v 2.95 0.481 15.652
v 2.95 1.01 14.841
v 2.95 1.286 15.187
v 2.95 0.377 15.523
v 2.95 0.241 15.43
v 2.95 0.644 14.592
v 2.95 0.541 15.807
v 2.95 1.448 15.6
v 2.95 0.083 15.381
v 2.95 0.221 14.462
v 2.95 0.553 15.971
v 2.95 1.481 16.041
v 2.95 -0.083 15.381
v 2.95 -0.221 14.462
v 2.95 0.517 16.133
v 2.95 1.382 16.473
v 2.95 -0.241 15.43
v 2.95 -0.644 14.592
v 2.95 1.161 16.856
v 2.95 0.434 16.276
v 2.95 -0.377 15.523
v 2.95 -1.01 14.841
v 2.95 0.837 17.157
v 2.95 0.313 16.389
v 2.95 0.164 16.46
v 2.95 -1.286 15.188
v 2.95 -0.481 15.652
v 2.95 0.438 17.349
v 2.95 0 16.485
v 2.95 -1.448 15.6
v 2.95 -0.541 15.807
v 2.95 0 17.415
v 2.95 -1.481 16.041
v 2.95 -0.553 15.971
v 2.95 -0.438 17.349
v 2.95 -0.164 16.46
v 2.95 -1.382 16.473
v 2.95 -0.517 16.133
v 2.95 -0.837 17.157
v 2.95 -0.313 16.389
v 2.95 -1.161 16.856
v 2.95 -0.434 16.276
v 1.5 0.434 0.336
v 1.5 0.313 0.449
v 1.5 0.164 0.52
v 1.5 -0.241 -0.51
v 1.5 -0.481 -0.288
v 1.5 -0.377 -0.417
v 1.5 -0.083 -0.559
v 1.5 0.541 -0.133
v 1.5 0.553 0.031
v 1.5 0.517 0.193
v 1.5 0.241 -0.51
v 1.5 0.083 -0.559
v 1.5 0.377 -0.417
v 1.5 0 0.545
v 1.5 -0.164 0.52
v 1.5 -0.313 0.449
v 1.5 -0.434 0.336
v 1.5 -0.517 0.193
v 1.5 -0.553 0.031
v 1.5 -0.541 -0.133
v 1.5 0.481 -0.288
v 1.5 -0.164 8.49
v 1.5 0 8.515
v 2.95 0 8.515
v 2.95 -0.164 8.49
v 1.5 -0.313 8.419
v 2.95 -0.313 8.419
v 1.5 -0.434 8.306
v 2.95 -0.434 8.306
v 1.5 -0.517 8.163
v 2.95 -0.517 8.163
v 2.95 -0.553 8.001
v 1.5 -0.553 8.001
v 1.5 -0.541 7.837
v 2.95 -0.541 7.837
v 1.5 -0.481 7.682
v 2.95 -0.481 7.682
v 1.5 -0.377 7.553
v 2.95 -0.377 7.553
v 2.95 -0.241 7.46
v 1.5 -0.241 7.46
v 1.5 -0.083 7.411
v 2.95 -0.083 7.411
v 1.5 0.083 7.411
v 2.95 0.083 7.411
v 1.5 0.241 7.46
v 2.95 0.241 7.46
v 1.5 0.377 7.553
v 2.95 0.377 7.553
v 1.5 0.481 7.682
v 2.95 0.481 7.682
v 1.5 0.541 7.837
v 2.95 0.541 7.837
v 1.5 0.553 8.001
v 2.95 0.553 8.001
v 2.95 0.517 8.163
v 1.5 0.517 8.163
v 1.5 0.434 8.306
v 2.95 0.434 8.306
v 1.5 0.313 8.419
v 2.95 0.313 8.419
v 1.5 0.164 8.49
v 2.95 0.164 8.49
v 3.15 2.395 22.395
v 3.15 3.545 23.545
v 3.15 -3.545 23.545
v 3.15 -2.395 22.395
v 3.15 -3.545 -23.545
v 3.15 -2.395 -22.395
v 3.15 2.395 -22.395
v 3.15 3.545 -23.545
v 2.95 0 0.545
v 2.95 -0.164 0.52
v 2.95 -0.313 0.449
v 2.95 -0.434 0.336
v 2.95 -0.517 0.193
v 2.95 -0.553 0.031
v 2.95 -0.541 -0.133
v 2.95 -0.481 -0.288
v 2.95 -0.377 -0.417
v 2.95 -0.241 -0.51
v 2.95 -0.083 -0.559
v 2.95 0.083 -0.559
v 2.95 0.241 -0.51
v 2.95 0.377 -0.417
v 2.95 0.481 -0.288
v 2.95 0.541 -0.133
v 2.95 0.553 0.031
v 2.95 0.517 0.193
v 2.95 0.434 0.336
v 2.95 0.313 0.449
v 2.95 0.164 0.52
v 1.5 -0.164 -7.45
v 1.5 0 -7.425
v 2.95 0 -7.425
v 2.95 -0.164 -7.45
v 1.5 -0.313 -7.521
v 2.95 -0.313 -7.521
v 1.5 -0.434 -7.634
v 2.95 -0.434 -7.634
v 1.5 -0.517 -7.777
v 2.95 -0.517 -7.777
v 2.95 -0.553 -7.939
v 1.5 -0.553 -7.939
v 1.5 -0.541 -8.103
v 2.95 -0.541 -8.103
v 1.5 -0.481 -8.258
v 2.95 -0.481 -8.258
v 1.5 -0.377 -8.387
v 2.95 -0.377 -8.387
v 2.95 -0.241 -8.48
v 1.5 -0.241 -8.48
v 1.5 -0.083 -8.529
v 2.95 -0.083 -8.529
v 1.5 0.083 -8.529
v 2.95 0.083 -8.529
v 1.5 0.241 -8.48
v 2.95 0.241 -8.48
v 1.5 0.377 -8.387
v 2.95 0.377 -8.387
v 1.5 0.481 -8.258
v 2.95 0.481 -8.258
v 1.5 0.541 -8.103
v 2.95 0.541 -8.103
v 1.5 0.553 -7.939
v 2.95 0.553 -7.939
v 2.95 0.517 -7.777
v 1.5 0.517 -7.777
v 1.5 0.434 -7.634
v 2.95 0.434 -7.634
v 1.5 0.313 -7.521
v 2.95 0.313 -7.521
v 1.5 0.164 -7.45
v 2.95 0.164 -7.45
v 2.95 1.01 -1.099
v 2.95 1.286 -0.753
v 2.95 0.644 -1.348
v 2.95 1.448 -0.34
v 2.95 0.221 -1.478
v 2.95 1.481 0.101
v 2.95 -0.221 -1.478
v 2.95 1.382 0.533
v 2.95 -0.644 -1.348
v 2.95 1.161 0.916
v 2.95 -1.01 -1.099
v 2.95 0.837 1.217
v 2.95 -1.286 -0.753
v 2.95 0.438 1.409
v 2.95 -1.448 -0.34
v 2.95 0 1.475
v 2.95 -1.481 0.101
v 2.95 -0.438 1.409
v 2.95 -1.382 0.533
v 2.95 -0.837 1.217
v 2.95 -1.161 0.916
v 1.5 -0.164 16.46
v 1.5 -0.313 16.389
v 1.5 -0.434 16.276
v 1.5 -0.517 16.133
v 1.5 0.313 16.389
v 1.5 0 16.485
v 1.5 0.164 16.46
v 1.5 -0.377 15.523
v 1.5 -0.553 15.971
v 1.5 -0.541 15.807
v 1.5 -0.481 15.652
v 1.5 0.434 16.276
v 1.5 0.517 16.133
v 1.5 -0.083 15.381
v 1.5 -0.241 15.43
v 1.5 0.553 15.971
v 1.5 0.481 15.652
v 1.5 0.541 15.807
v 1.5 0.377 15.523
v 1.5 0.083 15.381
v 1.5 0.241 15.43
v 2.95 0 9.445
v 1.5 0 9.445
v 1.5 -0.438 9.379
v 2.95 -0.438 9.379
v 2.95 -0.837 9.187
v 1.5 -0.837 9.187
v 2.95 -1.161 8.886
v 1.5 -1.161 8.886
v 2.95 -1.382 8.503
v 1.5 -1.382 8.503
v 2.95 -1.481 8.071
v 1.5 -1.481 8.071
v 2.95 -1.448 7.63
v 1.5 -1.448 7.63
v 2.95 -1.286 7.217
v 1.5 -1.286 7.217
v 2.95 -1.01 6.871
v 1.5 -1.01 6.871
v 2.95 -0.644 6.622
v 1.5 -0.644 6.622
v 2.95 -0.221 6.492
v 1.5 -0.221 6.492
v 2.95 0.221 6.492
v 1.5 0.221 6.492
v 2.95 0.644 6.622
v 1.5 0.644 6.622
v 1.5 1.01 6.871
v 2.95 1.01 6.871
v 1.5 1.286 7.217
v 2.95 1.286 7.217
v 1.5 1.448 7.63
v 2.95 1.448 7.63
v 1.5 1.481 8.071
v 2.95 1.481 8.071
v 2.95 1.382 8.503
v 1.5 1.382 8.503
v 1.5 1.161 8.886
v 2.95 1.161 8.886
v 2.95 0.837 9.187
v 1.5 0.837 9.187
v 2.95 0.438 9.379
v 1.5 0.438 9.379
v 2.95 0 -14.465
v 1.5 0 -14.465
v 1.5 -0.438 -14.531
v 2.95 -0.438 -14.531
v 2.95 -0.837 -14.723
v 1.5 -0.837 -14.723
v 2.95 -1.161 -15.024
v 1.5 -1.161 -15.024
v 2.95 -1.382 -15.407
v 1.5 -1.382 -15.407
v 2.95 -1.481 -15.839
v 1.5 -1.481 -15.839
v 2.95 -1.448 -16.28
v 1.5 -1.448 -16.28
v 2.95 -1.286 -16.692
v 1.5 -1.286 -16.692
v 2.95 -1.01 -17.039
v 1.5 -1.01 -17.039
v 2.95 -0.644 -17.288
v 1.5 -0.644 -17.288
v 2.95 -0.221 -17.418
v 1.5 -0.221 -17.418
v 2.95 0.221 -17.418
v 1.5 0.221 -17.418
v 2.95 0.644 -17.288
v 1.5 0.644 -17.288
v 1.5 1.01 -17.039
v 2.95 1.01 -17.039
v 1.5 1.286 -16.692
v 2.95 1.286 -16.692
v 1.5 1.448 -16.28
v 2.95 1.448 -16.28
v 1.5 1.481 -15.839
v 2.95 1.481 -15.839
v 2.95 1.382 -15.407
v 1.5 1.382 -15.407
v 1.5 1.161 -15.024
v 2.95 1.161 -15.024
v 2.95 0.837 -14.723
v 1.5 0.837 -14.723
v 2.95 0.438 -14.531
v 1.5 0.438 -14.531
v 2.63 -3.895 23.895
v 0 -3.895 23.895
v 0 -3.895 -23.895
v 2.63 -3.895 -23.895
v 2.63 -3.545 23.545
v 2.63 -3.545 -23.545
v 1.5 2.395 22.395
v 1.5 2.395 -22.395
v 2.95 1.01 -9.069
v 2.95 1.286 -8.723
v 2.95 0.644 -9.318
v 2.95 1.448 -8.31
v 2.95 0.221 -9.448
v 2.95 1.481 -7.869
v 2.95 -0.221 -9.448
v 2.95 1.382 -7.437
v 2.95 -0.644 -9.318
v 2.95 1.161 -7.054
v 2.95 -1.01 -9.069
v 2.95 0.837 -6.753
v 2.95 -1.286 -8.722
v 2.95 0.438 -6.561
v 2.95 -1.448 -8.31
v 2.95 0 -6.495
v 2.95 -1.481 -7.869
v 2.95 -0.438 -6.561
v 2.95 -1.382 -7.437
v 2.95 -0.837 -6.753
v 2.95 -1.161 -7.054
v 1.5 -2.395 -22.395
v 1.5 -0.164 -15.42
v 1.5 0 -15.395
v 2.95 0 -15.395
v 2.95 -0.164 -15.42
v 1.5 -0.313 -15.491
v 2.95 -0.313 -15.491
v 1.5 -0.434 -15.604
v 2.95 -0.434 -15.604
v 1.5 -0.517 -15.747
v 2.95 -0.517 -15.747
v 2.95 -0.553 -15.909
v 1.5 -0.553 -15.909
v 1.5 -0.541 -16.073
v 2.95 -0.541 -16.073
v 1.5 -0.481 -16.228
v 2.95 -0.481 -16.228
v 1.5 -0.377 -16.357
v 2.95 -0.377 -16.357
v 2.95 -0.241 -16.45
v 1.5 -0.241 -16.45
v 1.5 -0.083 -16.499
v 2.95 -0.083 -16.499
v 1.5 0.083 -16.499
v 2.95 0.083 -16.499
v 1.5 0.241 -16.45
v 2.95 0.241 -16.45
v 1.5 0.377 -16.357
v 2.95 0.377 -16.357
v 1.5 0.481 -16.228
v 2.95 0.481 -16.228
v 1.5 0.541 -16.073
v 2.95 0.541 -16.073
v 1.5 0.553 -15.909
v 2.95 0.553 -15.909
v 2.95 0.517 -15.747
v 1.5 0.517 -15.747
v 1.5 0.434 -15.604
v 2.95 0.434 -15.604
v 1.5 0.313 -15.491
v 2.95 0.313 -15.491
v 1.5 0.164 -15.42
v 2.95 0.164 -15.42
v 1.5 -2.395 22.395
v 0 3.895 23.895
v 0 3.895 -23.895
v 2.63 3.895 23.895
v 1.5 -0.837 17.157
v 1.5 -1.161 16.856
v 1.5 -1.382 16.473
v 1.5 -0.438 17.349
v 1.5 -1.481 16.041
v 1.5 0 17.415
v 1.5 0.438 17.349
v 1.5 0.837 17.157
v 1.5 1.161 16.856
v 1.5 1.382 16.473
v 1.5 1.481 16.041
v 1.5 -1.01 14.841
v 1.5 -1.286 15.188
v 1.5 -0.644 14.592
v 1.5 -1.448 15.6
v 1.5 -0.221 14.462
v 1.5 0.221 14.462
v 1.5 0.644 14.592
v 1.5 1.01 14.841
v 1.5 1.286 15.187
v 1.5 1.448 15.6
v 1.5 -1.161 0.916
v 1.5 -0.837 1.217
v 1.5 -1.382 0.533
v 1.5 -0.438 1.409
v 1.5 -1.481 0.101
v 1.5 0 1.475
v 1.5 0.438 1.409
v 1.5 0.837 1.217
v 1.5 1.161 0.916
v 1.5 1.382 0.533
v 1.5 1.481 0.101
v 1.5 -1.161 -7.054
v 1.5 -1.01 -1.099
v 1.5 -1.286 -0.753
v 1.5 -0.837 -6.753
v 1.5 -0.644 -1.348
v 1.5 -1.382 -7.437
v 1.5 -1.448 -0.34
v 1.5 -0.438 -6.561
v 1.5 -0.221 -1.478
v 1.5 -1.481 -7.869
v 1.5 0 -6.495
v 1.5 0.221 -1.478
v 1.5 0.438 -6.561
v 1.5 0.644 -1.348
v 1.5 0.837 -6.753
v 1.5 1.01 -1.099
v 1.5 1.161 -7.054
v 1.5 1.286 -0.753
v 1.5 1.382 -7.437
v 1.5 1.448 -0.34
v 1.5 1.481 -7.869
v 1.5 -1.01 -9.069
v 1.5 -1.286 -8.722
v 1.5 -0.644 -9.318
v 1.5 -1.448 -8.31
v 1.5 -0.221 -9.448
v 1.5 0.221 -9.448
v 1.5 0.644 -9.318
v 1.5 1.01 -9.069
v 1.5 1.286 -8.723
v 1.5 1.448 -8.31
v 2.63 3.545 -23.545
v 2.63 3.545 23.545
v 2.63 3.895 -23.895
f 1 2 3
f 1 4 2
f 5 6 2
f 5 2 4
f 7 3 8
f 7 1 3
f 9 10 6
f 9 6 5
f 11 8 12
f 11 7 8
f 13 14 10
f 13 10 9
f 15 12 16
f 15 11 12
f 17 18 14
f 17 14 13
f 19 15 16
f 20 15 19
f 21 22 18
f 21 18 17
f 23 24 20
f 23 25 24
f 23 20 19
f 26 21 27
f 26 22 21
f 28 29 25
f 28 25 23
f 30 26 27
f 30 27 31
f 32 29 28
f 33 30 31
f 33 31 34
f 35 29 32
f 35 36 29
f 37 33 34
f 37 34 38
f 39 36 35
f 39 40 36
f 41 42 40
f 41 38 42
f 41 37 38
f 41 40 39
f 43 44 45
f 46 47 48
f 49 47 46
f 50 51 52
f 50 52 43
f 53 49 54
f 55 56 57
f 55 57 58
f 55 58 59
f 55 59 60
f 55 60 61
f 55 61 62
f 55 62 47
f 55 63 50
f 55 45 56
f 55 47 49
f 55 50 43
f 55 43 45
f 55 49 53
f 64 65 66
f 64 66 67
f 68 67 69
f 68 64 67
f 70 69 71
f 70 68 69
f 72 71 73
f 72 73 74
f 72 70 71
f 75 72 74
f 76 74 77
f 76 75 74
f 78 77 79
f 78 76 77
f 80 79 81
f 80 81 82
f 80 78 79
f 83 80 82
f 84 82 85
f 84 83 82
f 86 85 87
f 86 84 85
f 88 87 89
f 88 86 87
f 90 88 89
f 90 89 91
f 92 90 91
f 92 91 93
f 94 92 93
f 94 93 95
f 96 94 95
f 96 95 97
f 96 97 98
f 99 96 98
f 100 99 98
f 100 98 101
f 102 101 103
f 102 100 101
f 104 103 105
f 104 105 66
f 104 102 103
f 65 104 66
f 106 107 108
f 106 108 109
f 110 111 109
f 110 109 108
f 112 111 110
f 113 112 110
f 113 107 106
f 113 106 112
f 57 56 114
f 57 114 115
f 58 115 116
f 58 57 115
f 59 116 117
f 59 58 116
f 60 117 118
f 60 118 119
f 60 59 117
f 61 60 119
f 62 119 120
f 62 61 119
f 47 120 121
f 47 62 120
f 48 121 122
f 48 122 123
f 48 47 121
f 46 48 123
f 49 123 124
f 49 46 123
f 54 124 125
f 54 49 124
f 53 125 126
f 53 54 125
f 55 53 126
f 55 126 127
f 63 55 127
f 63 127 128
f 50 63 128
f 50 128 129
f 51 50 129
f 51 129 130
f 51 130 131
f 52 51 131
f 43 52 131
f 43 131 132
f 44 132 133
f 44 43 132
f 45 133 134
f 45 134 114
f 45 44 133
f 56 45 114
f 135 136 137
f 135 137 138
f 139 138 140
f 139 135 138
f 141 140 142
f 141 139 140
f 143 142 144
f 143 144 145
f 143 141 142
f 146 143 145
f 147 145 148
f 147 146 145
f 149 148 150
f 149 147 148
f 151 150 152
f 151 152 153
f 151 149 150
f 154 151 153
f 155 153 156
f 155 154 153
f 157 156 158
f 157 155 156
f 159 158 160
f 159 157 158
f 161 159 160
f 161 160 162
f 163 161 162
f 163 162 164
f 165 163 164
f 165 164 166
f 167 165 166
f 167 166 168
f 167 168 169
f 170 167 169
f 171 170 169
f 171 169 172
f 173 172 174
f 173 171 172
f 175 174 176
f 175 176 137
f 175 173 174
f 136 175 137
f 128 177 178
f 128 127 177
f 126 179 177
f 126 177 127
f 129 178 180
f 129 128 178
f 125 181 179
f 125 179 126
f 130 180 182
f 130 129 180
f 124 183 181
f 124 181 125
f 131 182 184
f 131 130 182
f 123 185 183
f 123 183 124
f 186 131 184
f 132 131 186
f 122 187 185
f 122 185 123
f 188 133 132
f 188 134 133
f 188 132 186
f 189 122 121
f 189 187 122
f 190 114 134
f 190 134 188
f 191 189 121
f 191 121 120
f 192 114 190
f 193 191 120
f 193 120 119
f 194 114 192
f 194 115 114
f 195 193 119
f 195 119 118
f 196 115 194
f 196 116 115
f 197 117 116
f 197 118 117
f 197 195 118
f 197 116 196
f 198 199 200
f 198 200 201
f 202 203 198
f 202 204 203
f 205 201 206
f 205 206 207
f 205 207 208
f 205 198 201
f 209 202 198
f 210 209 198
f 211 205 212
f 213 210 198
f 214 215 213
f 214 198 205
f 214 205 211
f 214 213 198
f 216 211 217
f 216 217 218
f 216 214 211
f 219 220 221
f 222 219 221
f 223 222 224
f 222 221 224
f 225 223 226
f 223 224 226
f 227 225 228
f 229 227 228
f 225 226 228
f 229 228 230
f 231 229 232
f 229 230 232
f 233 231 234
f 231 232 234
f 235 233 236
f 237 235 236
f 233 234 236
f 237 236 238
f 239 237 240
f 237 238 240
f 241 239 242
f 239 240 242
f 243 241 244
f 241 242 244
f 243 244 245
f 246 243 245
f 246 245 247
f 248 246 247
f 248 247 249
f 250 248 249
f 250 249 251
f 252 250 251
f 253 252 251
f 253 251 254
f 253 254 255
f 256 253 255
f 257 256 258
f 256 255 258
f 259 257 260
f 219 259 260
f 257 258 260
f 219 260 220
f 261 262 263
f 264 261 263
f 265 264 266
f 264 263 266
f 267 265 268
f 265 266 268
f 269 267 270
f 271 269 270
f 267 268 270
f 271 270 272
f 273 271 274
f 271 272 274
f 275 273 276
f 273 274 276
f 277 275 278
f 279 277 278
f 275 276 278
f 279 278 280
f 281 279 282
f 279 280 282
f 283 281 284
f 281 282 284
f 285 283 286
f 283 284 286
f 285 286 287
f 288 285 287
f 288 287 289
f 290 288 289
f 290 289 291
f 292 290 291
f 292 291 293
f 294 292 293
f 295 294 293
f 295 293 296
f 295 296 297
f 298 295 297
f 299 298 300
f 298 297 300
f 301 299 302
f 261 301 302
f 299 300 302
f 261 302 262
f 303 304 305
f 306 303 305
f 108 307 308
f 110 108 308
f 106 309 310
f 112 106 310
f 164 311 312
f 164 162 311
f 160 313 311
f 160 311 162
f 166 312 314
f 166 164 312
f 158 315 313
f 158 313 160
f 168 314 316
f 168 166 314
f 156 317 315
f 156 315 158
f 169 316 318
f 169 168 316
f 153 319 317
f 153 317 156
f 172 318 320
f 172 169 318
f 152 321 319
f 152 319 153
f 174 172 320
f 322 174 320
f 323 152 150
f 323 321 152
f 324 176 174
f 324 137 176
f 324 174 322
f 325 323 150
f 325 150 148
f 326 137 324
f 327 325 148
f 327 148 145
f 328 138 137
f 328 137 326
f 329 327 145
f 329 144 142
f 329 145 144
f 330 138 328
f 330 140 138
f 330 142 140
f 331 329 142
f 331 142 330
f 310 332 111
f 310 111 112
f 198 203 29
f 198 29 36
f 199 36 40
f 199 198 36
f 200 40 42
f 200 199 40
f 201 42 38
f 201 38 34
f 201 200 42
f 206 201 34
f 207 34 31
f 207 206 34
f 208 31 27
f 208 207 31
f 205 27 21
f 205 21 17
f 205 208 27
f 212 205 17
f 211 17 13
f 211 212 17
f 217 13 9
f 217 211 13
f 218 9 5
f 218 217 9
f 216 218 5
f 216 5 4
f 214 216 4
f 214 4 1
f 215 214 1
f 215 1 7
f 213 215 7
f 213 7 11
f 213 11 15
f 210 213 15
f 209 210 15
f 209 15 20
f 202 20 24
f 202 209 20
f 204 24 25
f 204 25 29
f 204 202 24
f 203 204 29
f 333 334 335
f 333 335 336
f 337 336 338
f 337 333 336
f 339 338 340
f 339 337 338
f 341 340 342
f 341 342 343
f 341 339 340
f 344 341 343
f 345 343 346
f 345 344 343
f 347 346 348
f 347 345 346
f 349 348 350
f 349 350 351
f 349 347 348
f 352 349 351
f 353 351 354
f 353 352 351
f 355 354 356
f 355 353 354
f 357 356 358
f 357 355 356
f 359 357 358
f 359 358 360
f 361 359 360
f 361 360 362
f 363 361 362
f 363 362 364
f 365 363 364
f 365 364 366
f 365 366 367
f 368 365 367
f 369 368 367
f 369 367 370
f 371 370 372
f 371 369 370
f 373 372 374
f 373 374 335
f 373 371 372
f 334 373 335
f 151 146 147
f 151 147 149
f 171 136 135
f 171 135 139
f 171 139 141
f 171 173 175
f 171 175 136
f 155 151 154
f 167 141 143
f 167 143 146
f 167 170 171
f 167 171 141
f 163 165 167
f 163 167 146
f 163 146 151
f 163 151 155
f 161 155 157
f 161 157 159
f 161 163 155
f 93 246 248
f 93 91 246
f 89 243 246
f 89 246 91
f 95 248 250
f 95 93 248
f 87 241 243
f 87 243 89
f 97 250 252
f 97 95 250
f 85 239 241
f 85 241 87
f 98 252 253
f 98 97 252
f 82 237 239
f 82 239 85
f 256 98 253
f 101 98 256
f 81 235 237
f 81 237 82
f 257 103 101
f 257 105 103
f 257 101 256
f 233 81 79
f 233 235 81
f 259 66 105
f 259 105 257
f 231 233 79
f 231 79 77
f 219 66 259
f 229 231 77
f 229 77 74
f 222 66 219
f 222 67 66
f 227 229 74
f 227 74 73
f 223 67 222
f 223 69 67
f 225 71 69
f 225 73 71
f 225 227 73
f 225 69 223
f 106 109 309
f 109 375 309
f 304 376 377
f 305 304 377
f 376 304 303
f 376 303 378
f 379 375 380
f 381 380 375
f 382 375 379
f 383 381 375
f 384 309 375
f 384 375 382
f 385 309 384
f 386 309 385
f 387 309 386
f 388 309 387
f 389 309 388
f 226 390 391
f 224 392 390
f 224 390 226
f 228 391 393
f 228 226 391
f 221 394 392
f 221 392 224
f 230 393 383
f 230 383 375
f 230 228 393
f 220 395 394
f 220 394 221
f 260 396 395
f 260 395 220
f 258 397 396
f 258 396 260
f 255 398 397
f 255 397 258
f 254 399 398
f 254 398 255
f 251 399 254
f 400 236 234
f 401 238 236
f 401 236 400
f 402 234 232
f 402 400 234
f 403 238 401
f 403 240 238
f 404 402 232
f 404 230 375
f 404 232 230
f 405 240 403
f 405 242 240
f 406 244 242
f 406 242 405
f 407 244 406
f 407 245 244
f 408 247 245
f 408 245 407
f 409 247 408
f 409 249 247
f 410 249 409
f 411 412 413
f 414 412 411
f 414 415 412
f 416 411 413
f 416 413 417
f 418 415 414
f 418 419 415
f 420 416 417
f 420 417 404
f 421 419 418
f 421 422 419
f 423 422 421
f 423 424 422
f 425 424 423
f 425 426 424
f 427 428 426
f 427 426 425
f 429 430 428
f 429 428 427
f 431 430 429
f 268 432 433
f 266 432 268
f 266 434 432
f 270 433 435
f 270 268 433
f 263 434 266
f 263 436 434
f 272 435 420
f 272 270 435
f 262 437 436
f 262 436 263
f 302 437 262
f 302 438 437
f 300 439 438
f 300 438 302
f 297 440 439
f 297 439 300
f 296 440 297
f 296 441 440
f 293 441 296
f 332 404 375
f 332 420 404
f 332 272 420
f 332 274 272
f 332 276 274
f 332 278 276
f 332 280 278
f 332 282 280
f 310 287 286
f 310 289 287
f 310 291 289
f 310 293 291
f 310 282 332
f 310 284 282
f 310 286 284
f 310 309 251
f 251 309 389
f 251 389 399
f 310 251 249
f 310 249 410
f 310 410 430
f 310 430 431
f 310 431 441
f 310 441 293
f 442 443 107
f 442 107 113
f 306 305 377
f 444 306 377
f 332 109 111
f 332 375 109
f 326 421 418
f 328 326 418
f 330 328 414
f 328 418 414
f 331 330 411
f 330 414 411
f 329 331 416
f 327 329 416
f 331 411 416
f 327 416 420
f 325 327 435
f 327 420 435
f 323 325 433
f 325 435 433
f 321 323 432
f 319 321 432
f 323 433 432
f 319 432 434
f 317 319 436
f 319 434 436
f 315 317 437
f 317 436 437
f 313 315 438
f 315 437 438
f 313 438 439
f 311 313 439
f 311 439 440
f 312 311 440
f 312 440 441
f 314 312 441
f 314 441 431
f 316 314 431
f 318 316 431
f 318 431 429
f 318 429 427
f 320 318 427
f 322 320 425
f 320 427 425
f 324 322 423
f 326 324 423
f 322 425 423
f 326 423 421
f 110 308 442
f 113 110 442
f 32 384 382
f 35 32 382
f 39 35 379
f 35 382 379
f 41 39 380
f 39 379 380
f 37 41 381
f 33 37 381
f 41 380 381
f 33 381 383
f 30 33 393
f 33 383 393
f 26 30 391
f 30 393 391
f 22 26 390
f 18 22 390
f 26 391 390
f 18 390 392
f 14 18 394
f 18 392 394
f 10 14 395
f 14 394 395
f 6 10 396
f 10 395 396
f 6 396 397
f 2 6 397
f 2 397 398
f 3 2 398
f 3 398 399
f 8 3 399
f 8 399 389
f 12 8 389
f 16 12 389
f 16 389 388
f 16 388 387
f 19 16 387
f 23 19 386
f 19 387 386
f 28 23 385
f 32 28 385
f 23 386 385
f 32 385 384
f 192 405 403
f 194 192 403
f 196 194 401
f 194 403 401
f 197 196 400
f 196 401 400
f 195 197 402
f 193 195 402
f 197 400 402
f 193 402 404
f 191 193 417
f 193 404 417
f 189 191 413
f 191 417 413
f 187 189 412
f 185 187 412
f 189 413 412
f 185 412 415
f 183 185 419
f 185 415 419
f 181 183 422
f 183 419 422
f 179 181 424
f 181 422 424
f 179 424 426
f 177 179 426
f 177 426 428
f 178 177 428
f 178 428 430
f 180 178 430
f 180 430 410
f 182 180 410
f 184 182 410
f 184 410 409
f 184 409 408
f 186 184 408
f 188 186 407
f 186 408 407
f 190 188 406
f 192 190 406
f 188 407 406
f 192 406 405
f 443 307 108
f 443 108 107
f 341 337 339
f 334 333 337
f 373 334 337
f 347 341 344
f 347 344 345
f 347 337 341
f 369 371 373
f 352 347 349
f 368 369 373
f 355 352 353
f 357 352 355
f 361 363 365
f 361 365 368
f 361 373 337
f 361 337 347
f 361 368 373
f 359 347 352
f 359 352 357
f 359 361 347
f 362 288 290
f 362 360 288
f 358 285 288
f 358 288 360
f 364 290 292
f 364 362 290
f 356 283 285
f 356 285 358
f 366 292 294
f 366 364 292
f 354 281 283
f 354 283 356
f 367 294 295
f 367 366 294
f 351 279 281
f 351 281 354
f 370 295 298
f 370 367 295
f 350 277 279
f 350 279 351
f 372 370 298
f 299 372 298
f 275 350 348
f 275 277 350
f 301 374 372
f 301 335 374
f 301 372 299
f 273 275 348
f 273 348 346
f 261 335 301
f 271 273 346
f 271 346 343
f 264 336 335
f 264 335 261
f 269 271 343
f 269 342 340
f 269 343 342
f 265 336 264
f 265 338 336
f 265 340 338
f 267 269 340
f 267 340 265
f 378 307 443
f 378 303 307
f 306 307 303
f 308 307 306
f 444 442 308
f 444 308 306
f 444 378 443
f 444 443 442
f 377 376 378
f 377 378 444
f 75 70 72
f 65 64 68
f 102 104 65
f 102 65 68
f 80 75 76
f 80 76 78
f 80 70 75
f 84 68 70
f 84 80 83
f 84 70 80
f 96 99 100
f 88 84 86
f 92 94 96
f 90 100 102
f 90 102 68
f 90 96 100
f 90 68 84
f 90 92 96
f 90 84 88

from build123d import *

# Parameters (mm, degrees)
SKETCH1_W           = 47.79
SKETCH1_H           = 7.79
BOSS_EXTRUDE1_DEPTH = 2.63
SHELL1_T            = -1.5
SKETCH2_W           = 47.09
SKETCH2_H           = 7.09
SKETCH2_W_2         = 44.79
SKETCH2_H_2         = 4.79
BOSS_EXTRUDE2_DEPTH = 0.52
SKETCH3_R           = 1.485
SKETCH3_R_2         = 0.555
BOSS_EXTRUDE3_DEPTH = 1.45


with BuildPart() as part:
    # Sketch1 → Boss-Extrude1 (new body)
    with BuildSketch(Plane(origin=(0, 0, 0), x_dir=(0, 0, -1), z_dir=(1, 0, 0))):
        Rectangle(SKETCH1_W, SKETCH1_H)
    extrude(amount=BOSS_EXTRUDE1_DEPTH)

    # Shell1
    shell1_openings = [part.faces().sort_by_distance(p)[0] for p in [
        (2.63, 0, 0),
    ]]
    offset(amount=SHELL1_T, openings=shell1_openings, kind=Kind.INTERSECTION)

    # Sketch2 → Boss-Extrude2 (add)
    with BuildSketch(Plane(origin=(2.63, 0, 0), x_dir=(0, 0, -1), z_dir=(1, 0, 0))):
        Rectangle(SKETCH2_W, SKETCH2_H)
        Rectangle(SKETCH2_W_2, SKETCH2_H_2, mode=Mode.SUBTRACT)
    extrude(amount=BOSS_EXTRUDE2_DEPTH)

    # Sketch3 → Boss-Extrude3 (add)
    # profile 1 of 5: a face of its own
    with BuildSketch(Plane(origin=(1.5, 0, 0), x_dir=(0, 0, -1), z_dir=(1, 0, 0))):
        with Locations(Location((-15.93, 0, 0), (0, 0, 180))):
            Circle(SKETCH3_R)
        with Locations(Location((-15.93, 0, 0), (0, 0, 180))):
            Circle(SKETCH3_R_2, mode=Mode.SUBTRACT)
    # profile 2 of 5: a face of its own
    with BuildSketch(Plane(origin=(1.5, 0, 0), x_dir=(0, 0, -1), z_dir=(1, 0, 0))):
        with Locations(Location((-7.96, 0, 0), (0, 0, 180))):
            Circle(SKETCH3_R)
        with Locations(Location((-7.96, 0, 0), (0, 0, 180))):
            Circle(SKETCH3_R_2, mode=Mode.SUBTRACT)
    # profile 3 of 5: a face of its own
    with BuildSketch(Plane(origin=(1.5, 0, 0), x_dir=(0, 0, -1), z_dir=(1, 0, 0))):
        with Locations(Location((0.01, 0, 0), (0, 0, 180))):
            Circle(SKETCH3_R)
        with Locations(Location((0.01, 0, 0), (0, 0, 180))):
            Circle(SKETCH3_R_2, mode=Mode.SUBTRACT)
    # profile 4 of 5: a face of its own
    with BuildSketch(Plane(origin=(1.5, 0, 0), x_dir=(0, 0, -1), z_dir=(1, 0, 0))):
        with Locations(Location((7.98, 0, 0), (0, 0, 180))):
            Circle(SKETCH3_R)
        with Locations(Location((7.98, 0, 0), (0, 0, 180))):
            Circle(SKETCH3_R_2, mode=Mode.SUBTRACT)
    # profile 5 of 5: a face of its own
    with BuildSketch(Plane(origin=(1.5, 0, 0), x_dir=(0, 0, -1), z_dir=(1, 0, 0))):
        with Locations(Location((15.95, 0, 0), (0, 0, 180))):
            Circle(SKETCH3_R)
        with Locations(Location((15.95, 0, 0), (0, 0, 180))):
            Circle(SKETCH3_R_2, mode=Mode.SUBTRACT)
    extrude(amount=BOSS_EXTRUDE3_DEPTH)


solid = part.part
